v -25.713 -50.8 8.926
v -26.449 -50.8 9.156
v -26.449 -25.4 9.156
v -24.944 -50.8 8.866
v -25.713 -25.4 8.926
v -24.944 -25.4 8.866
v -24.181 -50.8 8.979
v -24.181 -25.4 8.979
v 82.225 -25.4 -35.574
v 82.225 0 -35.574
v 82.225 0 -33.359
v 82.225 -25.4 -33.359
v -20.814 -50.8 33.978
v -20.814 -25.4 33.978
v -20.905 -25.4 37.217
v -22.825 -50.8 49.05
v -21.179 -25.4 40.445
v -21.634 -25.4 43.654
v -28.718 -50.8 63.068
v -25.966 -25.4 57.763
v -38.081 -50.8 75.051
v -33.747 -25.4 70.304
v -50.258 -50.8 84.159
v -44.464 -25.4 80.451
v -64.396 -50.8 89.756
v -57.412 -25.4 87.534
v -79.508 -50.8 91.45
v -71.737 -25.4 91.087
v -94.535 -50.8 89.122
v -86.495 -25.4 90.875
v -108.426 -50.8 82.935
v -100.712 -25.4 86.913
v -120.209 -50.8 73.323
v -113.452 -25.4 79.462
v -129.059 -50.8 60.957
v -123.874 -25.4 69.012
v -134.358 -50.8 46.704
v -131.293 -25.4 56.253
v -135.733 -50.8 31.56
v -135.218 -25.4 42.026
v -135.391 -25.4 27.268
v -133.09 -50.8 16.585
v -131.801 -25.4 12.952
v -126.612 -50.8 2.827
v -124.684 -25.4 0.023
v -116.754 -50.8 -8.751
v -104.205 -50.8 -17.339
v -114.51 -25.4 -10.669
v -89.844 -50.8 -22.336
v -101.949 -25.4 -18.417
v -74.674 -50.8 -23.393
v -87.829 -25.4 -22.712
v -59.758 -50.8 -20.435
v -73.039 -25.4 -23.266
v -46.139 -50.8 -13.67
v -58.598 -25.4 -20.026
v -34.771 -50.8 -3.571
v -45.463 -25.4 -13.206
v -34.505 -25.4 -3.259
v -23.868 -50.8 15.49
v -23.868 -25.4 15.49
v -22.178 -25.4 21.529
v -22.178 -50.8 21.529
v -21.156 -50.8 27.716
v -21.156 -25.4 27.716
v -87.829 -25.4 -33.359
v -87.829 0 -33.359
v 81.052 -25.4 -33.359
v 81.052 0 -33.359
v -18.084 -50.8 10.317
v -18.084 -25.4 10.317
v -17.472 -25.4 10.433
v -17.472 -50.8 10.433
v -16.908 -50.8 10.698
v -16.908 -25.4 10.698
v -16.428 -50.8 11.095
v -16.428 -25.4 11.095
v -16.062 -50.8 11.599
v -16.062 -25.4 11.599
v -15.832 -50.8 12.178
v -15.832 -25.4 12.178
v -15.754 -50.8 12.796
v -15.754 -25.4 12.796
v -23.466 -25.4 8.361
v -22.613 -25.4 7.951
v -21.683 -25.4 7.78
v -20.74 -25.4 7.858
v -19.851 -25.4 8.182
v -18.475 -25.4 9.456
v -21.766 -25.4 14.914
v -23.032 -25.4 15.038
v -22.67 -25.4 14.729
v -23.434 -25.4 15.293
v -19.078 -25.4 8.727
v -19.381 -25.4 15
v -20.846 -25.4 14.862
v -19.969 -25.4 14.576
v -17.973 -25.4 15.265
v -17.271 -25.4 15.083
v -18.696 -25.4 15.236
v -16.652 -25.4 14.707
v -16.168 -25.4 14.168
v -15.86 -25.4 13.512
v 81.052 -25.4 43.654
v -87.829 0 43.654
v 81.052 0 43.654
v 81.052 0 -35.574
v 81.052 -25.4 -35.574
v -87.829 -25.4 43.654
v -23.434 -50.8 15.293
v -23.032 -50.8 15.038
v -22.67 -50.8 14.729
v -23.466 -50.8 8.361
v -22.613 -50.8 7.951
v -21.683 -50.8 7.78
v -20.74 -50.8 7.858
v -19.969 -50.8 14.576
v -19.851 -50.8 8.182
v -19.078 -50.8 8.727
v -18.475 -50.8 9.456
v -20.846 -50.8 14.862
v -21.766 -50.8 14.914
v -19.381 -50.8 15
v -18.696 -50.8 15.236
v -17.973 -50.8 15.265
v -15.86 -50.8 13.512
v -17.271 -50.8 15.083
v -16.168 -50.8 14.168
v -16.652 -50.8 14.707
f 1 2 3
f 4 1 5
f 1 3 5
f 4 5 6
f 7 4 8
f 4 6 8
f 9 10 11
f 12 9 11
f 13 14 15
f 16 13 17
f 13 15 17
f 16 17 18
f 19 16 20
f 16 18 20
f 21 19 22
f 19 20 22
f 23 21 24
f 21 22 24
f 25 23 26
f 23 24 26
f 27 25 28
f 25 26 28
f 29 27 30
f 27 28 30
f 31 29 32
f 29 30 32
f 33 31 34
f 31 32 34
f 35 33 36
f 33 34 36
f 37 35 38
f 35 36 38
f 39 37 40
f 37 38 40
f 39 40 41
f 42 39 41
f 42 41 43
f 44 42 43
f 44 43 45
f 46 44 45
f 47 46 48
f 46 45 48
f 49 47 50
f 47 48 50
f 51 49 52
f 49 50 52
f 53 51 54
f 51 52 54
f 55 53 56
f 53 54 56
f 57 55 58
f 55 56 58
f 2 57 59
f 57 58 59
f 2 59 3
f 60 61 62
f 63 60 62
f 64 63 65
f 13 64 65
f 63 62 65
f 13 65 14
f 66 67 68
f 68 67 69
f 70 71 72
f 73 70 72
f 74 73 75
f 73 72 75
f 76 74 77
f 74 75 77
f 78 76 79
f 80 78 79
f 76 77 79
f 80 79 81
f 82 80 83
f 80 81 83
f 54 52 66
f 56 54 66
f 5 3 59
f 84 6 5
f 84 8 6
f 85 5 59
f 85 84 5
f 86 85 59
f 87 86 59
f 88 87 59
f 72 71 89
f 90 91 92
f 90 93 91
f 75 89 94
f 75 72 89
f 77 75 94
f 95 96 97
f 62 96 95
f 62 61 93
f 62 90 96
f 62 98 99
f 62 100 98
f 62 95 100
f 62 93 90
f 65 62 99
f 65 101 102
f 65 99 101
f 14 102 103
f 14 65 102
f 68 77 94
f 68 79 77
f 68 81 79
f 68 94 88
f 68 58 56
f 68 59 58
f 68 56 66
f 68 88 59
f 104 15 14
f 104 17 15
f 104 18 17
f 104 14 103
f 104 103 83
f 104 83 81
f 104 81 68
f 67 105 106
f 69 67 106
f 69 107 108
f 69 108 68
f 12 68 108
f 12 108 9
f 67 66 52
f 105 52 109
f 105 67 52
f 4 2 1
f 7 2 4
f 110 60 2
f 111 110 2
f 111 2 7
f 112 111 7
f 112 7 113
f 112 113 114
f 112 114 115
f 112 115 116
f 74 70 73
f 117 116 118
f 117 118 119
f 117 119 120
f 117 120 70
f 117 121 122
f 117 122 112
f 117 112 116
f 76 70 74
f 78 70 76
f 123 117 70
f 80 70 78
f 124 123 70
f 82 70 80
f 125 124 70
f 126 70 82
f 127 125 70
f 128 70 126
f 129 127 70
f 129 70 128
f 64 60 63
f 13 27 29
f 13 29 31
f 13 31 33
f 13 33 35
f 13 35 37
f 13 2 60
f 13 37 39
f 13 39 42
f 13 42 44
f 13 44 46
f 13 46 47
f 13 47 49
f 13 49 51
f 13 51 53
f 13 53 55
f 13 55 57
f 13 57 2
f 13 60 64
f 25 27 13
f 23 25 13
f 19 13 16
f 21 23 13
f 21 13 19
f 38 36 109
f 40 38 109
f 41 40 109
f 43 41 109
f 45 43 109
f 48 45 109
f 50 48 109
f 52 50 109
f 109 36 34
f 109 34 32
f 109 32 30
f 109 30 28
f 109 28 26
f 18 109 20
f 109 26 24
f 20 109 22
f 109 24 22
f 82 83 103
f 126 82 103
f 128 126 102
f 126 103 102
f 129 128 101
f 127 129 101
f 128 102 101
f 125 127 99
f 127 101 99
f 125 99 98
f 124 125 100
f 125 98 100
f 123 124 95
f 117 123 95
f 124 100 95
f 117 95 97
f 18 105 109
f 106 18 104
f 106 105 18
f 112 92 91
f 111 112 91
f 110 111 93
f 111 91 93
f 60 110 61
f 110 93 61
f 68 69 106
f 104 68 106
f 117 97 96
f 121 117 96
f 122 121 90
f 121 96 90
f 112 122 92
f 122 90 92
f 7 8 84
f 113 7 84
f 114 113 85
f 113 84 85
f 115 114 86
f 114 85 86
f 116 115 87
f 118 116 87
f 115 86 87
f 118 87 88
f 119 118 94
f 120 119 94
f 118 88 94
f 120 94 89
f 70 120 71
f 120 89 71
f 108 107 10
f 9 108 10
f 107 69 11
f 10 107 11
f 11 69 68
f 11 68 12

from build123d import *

# Parameters (mm, degrees)
F0_W     = 1.1727884412
F0_H     = 2.2152625024
F1_DEPTH = 25.4
F0_W_2   = 168.8810437918
F0_H_2   = 77.0128853619
F3_DEPTH = 25.4


with BuildPart() as f1:
    # F0 (on Front) → F1 (new body)
    with BuildSketch(Plane.XZ):
        with Locations((81.6388688982, -34.46684964)):
            Rectangle(F0_W, F0_H)
    extrude(amount=F1_DEPTH)


with BuildPart() as f1b:
    # F0 (on Front) → F1, piece 2 (new body)
    with BuildSketch(Plane.XZ):
        with Locations((-3.3880472183, 5.1472242922)):
            Rectangle(F0_W_2, F0_H_2)
    extrude(amount=F1_DEPTH)

    # F2 (on face) → F3 (join)
    with BuildSketch(Plane.XZ.offset(25.4)):
        with BuildLine():
            ThreePointArc((-23.8678798597, 15.4904454531), (-21.5826497557, 24.6087277634), (-20.814055479, 33.9775383472))
            ThreePointArc((-20.814055479, 33.9775383472), (-134.3577236065, 46.7039103537), (-26.4489315491, 9.1563709802))
            ThreePointArc((-26.4489315491, 9.1563709802), (-28.2325565865, 13.5760840987), (-23.8678798597, 15.4904454531))
        make_face()
        with BuildLine():
            ThreePointArc((-23.8678798597, 15.4904454531), (-28.2325565865, 13.5760840987), (-26.4489315491, 9.1563709802))
            ThreePointArc((-26.4489315491, 9.1563709802), (-25.0641160561, 12.2849864303), (-23.8678798597, 15.4904454531))
        make_face()
        with BuildLine():
            ThreePointArc((-23.8678798597, 15.4904454531), (-25.0641160561, 12.2849864303), (-26.4489315491, 9.1563709802))
            ThreePointArc((-26.4489315491, 9.1563709802), (-25.3302802912, 8.8739594318), (-24.1813622815, 8.9794313547))
            ThreePointArc((-24.1813622815, 8.9794313547), (-24.9628096472, 12.2583526219), (-22.6697847258, 14.7289843978))
            ThreePointArc((-22.6697847258, 14.7289843978), (-23.2289050258, 15.1725371326), (-23.8678798597, 15.4904454531))
        make_face()
        with BuildLine():
            ThreePointArc((-22.6697847258, 14.7289843978), (-24.9628096472, 12.2583526219), (-24.1813622815, 8.9794313547))
            ThreePointArc((-24.1813622815, 8.9794313547), (-22.3506129182, 10.2010360219), (-21.642720349, 12.2849864303))
            ThreePointArc((-21.642720349, 12.2849864303), (-21.9099201586, 13.6105039989), (-22.6697847258, 14.7289843978))
        make_face()
        with BuildLine():
            ThreePointArc((-21.642720349, 12.2849864303), (-22.3506129182, 10.2010360219), (-24.1813622815, 8.9794313547))
            ThreePointArc((-24.1813622815, 8.9794313547), (-20.740198367, 7.8584845453), (-18.0843849342, 10.3170991647))
            ThreePointArc((-18.0843849342, 10.3170991647), (-20.508644808, 11.7909236933), (-19.9688253979, 14.5762045914))
            ThreePointArc((-19.9688253979, 14.5762045914), (-21.3042917621, 14.9180111954), (-22.6697847258, 14.7289843978))
            ThreePointArc((-22.6697847258, 14.7289843978), (-21.9099201586, 13.6105039989), (-21.642720349, 12.2849864303))
        make_face()
        with BuildLine():
            ThreePointArc((-19.9688253979, 14.5762045914), (-20.508644808, 11.7909236933), (-18.0843849342, 10.3170991647))
            ThreePointArc((-18.0843849342, 10.3170991647), (-17.9703064735, 10.8277487678), (-17.9320067111, 11.3495821133))
            ThreePointArc((-17.9320067111, 11.3495821133), (-18.4838067901, 13.2574423663), (-19.9688253979, 14.5762045914))
        make_face()
        with BuildLine():
            ThreePointArc((-17.9320067111, 11.3495821133), (-17.9703064735, 10.8277487678), (-18.0843849342, 10.3170991647))
            ThreePointArc((-18.0843849342, 10.3170991647), (-16.4282646532, 11.0947728981), (-15.7542773342, 12.7957290747))
            ThreePointArc((-15.7542773342, 12.7957290747), (-17.2712212957, 15.083331993), (-19.9688253979, 14.5762045914))
            ThreePointArc((-19.9688253979, 14.5762045914), (-18.4838067901, 13.2574423663), (-17.9320067111, 11.3495821133))
        make_face()
    extrude(amount=F3_DEPTH)


solid = Compound([f1.part, f1b.part])
